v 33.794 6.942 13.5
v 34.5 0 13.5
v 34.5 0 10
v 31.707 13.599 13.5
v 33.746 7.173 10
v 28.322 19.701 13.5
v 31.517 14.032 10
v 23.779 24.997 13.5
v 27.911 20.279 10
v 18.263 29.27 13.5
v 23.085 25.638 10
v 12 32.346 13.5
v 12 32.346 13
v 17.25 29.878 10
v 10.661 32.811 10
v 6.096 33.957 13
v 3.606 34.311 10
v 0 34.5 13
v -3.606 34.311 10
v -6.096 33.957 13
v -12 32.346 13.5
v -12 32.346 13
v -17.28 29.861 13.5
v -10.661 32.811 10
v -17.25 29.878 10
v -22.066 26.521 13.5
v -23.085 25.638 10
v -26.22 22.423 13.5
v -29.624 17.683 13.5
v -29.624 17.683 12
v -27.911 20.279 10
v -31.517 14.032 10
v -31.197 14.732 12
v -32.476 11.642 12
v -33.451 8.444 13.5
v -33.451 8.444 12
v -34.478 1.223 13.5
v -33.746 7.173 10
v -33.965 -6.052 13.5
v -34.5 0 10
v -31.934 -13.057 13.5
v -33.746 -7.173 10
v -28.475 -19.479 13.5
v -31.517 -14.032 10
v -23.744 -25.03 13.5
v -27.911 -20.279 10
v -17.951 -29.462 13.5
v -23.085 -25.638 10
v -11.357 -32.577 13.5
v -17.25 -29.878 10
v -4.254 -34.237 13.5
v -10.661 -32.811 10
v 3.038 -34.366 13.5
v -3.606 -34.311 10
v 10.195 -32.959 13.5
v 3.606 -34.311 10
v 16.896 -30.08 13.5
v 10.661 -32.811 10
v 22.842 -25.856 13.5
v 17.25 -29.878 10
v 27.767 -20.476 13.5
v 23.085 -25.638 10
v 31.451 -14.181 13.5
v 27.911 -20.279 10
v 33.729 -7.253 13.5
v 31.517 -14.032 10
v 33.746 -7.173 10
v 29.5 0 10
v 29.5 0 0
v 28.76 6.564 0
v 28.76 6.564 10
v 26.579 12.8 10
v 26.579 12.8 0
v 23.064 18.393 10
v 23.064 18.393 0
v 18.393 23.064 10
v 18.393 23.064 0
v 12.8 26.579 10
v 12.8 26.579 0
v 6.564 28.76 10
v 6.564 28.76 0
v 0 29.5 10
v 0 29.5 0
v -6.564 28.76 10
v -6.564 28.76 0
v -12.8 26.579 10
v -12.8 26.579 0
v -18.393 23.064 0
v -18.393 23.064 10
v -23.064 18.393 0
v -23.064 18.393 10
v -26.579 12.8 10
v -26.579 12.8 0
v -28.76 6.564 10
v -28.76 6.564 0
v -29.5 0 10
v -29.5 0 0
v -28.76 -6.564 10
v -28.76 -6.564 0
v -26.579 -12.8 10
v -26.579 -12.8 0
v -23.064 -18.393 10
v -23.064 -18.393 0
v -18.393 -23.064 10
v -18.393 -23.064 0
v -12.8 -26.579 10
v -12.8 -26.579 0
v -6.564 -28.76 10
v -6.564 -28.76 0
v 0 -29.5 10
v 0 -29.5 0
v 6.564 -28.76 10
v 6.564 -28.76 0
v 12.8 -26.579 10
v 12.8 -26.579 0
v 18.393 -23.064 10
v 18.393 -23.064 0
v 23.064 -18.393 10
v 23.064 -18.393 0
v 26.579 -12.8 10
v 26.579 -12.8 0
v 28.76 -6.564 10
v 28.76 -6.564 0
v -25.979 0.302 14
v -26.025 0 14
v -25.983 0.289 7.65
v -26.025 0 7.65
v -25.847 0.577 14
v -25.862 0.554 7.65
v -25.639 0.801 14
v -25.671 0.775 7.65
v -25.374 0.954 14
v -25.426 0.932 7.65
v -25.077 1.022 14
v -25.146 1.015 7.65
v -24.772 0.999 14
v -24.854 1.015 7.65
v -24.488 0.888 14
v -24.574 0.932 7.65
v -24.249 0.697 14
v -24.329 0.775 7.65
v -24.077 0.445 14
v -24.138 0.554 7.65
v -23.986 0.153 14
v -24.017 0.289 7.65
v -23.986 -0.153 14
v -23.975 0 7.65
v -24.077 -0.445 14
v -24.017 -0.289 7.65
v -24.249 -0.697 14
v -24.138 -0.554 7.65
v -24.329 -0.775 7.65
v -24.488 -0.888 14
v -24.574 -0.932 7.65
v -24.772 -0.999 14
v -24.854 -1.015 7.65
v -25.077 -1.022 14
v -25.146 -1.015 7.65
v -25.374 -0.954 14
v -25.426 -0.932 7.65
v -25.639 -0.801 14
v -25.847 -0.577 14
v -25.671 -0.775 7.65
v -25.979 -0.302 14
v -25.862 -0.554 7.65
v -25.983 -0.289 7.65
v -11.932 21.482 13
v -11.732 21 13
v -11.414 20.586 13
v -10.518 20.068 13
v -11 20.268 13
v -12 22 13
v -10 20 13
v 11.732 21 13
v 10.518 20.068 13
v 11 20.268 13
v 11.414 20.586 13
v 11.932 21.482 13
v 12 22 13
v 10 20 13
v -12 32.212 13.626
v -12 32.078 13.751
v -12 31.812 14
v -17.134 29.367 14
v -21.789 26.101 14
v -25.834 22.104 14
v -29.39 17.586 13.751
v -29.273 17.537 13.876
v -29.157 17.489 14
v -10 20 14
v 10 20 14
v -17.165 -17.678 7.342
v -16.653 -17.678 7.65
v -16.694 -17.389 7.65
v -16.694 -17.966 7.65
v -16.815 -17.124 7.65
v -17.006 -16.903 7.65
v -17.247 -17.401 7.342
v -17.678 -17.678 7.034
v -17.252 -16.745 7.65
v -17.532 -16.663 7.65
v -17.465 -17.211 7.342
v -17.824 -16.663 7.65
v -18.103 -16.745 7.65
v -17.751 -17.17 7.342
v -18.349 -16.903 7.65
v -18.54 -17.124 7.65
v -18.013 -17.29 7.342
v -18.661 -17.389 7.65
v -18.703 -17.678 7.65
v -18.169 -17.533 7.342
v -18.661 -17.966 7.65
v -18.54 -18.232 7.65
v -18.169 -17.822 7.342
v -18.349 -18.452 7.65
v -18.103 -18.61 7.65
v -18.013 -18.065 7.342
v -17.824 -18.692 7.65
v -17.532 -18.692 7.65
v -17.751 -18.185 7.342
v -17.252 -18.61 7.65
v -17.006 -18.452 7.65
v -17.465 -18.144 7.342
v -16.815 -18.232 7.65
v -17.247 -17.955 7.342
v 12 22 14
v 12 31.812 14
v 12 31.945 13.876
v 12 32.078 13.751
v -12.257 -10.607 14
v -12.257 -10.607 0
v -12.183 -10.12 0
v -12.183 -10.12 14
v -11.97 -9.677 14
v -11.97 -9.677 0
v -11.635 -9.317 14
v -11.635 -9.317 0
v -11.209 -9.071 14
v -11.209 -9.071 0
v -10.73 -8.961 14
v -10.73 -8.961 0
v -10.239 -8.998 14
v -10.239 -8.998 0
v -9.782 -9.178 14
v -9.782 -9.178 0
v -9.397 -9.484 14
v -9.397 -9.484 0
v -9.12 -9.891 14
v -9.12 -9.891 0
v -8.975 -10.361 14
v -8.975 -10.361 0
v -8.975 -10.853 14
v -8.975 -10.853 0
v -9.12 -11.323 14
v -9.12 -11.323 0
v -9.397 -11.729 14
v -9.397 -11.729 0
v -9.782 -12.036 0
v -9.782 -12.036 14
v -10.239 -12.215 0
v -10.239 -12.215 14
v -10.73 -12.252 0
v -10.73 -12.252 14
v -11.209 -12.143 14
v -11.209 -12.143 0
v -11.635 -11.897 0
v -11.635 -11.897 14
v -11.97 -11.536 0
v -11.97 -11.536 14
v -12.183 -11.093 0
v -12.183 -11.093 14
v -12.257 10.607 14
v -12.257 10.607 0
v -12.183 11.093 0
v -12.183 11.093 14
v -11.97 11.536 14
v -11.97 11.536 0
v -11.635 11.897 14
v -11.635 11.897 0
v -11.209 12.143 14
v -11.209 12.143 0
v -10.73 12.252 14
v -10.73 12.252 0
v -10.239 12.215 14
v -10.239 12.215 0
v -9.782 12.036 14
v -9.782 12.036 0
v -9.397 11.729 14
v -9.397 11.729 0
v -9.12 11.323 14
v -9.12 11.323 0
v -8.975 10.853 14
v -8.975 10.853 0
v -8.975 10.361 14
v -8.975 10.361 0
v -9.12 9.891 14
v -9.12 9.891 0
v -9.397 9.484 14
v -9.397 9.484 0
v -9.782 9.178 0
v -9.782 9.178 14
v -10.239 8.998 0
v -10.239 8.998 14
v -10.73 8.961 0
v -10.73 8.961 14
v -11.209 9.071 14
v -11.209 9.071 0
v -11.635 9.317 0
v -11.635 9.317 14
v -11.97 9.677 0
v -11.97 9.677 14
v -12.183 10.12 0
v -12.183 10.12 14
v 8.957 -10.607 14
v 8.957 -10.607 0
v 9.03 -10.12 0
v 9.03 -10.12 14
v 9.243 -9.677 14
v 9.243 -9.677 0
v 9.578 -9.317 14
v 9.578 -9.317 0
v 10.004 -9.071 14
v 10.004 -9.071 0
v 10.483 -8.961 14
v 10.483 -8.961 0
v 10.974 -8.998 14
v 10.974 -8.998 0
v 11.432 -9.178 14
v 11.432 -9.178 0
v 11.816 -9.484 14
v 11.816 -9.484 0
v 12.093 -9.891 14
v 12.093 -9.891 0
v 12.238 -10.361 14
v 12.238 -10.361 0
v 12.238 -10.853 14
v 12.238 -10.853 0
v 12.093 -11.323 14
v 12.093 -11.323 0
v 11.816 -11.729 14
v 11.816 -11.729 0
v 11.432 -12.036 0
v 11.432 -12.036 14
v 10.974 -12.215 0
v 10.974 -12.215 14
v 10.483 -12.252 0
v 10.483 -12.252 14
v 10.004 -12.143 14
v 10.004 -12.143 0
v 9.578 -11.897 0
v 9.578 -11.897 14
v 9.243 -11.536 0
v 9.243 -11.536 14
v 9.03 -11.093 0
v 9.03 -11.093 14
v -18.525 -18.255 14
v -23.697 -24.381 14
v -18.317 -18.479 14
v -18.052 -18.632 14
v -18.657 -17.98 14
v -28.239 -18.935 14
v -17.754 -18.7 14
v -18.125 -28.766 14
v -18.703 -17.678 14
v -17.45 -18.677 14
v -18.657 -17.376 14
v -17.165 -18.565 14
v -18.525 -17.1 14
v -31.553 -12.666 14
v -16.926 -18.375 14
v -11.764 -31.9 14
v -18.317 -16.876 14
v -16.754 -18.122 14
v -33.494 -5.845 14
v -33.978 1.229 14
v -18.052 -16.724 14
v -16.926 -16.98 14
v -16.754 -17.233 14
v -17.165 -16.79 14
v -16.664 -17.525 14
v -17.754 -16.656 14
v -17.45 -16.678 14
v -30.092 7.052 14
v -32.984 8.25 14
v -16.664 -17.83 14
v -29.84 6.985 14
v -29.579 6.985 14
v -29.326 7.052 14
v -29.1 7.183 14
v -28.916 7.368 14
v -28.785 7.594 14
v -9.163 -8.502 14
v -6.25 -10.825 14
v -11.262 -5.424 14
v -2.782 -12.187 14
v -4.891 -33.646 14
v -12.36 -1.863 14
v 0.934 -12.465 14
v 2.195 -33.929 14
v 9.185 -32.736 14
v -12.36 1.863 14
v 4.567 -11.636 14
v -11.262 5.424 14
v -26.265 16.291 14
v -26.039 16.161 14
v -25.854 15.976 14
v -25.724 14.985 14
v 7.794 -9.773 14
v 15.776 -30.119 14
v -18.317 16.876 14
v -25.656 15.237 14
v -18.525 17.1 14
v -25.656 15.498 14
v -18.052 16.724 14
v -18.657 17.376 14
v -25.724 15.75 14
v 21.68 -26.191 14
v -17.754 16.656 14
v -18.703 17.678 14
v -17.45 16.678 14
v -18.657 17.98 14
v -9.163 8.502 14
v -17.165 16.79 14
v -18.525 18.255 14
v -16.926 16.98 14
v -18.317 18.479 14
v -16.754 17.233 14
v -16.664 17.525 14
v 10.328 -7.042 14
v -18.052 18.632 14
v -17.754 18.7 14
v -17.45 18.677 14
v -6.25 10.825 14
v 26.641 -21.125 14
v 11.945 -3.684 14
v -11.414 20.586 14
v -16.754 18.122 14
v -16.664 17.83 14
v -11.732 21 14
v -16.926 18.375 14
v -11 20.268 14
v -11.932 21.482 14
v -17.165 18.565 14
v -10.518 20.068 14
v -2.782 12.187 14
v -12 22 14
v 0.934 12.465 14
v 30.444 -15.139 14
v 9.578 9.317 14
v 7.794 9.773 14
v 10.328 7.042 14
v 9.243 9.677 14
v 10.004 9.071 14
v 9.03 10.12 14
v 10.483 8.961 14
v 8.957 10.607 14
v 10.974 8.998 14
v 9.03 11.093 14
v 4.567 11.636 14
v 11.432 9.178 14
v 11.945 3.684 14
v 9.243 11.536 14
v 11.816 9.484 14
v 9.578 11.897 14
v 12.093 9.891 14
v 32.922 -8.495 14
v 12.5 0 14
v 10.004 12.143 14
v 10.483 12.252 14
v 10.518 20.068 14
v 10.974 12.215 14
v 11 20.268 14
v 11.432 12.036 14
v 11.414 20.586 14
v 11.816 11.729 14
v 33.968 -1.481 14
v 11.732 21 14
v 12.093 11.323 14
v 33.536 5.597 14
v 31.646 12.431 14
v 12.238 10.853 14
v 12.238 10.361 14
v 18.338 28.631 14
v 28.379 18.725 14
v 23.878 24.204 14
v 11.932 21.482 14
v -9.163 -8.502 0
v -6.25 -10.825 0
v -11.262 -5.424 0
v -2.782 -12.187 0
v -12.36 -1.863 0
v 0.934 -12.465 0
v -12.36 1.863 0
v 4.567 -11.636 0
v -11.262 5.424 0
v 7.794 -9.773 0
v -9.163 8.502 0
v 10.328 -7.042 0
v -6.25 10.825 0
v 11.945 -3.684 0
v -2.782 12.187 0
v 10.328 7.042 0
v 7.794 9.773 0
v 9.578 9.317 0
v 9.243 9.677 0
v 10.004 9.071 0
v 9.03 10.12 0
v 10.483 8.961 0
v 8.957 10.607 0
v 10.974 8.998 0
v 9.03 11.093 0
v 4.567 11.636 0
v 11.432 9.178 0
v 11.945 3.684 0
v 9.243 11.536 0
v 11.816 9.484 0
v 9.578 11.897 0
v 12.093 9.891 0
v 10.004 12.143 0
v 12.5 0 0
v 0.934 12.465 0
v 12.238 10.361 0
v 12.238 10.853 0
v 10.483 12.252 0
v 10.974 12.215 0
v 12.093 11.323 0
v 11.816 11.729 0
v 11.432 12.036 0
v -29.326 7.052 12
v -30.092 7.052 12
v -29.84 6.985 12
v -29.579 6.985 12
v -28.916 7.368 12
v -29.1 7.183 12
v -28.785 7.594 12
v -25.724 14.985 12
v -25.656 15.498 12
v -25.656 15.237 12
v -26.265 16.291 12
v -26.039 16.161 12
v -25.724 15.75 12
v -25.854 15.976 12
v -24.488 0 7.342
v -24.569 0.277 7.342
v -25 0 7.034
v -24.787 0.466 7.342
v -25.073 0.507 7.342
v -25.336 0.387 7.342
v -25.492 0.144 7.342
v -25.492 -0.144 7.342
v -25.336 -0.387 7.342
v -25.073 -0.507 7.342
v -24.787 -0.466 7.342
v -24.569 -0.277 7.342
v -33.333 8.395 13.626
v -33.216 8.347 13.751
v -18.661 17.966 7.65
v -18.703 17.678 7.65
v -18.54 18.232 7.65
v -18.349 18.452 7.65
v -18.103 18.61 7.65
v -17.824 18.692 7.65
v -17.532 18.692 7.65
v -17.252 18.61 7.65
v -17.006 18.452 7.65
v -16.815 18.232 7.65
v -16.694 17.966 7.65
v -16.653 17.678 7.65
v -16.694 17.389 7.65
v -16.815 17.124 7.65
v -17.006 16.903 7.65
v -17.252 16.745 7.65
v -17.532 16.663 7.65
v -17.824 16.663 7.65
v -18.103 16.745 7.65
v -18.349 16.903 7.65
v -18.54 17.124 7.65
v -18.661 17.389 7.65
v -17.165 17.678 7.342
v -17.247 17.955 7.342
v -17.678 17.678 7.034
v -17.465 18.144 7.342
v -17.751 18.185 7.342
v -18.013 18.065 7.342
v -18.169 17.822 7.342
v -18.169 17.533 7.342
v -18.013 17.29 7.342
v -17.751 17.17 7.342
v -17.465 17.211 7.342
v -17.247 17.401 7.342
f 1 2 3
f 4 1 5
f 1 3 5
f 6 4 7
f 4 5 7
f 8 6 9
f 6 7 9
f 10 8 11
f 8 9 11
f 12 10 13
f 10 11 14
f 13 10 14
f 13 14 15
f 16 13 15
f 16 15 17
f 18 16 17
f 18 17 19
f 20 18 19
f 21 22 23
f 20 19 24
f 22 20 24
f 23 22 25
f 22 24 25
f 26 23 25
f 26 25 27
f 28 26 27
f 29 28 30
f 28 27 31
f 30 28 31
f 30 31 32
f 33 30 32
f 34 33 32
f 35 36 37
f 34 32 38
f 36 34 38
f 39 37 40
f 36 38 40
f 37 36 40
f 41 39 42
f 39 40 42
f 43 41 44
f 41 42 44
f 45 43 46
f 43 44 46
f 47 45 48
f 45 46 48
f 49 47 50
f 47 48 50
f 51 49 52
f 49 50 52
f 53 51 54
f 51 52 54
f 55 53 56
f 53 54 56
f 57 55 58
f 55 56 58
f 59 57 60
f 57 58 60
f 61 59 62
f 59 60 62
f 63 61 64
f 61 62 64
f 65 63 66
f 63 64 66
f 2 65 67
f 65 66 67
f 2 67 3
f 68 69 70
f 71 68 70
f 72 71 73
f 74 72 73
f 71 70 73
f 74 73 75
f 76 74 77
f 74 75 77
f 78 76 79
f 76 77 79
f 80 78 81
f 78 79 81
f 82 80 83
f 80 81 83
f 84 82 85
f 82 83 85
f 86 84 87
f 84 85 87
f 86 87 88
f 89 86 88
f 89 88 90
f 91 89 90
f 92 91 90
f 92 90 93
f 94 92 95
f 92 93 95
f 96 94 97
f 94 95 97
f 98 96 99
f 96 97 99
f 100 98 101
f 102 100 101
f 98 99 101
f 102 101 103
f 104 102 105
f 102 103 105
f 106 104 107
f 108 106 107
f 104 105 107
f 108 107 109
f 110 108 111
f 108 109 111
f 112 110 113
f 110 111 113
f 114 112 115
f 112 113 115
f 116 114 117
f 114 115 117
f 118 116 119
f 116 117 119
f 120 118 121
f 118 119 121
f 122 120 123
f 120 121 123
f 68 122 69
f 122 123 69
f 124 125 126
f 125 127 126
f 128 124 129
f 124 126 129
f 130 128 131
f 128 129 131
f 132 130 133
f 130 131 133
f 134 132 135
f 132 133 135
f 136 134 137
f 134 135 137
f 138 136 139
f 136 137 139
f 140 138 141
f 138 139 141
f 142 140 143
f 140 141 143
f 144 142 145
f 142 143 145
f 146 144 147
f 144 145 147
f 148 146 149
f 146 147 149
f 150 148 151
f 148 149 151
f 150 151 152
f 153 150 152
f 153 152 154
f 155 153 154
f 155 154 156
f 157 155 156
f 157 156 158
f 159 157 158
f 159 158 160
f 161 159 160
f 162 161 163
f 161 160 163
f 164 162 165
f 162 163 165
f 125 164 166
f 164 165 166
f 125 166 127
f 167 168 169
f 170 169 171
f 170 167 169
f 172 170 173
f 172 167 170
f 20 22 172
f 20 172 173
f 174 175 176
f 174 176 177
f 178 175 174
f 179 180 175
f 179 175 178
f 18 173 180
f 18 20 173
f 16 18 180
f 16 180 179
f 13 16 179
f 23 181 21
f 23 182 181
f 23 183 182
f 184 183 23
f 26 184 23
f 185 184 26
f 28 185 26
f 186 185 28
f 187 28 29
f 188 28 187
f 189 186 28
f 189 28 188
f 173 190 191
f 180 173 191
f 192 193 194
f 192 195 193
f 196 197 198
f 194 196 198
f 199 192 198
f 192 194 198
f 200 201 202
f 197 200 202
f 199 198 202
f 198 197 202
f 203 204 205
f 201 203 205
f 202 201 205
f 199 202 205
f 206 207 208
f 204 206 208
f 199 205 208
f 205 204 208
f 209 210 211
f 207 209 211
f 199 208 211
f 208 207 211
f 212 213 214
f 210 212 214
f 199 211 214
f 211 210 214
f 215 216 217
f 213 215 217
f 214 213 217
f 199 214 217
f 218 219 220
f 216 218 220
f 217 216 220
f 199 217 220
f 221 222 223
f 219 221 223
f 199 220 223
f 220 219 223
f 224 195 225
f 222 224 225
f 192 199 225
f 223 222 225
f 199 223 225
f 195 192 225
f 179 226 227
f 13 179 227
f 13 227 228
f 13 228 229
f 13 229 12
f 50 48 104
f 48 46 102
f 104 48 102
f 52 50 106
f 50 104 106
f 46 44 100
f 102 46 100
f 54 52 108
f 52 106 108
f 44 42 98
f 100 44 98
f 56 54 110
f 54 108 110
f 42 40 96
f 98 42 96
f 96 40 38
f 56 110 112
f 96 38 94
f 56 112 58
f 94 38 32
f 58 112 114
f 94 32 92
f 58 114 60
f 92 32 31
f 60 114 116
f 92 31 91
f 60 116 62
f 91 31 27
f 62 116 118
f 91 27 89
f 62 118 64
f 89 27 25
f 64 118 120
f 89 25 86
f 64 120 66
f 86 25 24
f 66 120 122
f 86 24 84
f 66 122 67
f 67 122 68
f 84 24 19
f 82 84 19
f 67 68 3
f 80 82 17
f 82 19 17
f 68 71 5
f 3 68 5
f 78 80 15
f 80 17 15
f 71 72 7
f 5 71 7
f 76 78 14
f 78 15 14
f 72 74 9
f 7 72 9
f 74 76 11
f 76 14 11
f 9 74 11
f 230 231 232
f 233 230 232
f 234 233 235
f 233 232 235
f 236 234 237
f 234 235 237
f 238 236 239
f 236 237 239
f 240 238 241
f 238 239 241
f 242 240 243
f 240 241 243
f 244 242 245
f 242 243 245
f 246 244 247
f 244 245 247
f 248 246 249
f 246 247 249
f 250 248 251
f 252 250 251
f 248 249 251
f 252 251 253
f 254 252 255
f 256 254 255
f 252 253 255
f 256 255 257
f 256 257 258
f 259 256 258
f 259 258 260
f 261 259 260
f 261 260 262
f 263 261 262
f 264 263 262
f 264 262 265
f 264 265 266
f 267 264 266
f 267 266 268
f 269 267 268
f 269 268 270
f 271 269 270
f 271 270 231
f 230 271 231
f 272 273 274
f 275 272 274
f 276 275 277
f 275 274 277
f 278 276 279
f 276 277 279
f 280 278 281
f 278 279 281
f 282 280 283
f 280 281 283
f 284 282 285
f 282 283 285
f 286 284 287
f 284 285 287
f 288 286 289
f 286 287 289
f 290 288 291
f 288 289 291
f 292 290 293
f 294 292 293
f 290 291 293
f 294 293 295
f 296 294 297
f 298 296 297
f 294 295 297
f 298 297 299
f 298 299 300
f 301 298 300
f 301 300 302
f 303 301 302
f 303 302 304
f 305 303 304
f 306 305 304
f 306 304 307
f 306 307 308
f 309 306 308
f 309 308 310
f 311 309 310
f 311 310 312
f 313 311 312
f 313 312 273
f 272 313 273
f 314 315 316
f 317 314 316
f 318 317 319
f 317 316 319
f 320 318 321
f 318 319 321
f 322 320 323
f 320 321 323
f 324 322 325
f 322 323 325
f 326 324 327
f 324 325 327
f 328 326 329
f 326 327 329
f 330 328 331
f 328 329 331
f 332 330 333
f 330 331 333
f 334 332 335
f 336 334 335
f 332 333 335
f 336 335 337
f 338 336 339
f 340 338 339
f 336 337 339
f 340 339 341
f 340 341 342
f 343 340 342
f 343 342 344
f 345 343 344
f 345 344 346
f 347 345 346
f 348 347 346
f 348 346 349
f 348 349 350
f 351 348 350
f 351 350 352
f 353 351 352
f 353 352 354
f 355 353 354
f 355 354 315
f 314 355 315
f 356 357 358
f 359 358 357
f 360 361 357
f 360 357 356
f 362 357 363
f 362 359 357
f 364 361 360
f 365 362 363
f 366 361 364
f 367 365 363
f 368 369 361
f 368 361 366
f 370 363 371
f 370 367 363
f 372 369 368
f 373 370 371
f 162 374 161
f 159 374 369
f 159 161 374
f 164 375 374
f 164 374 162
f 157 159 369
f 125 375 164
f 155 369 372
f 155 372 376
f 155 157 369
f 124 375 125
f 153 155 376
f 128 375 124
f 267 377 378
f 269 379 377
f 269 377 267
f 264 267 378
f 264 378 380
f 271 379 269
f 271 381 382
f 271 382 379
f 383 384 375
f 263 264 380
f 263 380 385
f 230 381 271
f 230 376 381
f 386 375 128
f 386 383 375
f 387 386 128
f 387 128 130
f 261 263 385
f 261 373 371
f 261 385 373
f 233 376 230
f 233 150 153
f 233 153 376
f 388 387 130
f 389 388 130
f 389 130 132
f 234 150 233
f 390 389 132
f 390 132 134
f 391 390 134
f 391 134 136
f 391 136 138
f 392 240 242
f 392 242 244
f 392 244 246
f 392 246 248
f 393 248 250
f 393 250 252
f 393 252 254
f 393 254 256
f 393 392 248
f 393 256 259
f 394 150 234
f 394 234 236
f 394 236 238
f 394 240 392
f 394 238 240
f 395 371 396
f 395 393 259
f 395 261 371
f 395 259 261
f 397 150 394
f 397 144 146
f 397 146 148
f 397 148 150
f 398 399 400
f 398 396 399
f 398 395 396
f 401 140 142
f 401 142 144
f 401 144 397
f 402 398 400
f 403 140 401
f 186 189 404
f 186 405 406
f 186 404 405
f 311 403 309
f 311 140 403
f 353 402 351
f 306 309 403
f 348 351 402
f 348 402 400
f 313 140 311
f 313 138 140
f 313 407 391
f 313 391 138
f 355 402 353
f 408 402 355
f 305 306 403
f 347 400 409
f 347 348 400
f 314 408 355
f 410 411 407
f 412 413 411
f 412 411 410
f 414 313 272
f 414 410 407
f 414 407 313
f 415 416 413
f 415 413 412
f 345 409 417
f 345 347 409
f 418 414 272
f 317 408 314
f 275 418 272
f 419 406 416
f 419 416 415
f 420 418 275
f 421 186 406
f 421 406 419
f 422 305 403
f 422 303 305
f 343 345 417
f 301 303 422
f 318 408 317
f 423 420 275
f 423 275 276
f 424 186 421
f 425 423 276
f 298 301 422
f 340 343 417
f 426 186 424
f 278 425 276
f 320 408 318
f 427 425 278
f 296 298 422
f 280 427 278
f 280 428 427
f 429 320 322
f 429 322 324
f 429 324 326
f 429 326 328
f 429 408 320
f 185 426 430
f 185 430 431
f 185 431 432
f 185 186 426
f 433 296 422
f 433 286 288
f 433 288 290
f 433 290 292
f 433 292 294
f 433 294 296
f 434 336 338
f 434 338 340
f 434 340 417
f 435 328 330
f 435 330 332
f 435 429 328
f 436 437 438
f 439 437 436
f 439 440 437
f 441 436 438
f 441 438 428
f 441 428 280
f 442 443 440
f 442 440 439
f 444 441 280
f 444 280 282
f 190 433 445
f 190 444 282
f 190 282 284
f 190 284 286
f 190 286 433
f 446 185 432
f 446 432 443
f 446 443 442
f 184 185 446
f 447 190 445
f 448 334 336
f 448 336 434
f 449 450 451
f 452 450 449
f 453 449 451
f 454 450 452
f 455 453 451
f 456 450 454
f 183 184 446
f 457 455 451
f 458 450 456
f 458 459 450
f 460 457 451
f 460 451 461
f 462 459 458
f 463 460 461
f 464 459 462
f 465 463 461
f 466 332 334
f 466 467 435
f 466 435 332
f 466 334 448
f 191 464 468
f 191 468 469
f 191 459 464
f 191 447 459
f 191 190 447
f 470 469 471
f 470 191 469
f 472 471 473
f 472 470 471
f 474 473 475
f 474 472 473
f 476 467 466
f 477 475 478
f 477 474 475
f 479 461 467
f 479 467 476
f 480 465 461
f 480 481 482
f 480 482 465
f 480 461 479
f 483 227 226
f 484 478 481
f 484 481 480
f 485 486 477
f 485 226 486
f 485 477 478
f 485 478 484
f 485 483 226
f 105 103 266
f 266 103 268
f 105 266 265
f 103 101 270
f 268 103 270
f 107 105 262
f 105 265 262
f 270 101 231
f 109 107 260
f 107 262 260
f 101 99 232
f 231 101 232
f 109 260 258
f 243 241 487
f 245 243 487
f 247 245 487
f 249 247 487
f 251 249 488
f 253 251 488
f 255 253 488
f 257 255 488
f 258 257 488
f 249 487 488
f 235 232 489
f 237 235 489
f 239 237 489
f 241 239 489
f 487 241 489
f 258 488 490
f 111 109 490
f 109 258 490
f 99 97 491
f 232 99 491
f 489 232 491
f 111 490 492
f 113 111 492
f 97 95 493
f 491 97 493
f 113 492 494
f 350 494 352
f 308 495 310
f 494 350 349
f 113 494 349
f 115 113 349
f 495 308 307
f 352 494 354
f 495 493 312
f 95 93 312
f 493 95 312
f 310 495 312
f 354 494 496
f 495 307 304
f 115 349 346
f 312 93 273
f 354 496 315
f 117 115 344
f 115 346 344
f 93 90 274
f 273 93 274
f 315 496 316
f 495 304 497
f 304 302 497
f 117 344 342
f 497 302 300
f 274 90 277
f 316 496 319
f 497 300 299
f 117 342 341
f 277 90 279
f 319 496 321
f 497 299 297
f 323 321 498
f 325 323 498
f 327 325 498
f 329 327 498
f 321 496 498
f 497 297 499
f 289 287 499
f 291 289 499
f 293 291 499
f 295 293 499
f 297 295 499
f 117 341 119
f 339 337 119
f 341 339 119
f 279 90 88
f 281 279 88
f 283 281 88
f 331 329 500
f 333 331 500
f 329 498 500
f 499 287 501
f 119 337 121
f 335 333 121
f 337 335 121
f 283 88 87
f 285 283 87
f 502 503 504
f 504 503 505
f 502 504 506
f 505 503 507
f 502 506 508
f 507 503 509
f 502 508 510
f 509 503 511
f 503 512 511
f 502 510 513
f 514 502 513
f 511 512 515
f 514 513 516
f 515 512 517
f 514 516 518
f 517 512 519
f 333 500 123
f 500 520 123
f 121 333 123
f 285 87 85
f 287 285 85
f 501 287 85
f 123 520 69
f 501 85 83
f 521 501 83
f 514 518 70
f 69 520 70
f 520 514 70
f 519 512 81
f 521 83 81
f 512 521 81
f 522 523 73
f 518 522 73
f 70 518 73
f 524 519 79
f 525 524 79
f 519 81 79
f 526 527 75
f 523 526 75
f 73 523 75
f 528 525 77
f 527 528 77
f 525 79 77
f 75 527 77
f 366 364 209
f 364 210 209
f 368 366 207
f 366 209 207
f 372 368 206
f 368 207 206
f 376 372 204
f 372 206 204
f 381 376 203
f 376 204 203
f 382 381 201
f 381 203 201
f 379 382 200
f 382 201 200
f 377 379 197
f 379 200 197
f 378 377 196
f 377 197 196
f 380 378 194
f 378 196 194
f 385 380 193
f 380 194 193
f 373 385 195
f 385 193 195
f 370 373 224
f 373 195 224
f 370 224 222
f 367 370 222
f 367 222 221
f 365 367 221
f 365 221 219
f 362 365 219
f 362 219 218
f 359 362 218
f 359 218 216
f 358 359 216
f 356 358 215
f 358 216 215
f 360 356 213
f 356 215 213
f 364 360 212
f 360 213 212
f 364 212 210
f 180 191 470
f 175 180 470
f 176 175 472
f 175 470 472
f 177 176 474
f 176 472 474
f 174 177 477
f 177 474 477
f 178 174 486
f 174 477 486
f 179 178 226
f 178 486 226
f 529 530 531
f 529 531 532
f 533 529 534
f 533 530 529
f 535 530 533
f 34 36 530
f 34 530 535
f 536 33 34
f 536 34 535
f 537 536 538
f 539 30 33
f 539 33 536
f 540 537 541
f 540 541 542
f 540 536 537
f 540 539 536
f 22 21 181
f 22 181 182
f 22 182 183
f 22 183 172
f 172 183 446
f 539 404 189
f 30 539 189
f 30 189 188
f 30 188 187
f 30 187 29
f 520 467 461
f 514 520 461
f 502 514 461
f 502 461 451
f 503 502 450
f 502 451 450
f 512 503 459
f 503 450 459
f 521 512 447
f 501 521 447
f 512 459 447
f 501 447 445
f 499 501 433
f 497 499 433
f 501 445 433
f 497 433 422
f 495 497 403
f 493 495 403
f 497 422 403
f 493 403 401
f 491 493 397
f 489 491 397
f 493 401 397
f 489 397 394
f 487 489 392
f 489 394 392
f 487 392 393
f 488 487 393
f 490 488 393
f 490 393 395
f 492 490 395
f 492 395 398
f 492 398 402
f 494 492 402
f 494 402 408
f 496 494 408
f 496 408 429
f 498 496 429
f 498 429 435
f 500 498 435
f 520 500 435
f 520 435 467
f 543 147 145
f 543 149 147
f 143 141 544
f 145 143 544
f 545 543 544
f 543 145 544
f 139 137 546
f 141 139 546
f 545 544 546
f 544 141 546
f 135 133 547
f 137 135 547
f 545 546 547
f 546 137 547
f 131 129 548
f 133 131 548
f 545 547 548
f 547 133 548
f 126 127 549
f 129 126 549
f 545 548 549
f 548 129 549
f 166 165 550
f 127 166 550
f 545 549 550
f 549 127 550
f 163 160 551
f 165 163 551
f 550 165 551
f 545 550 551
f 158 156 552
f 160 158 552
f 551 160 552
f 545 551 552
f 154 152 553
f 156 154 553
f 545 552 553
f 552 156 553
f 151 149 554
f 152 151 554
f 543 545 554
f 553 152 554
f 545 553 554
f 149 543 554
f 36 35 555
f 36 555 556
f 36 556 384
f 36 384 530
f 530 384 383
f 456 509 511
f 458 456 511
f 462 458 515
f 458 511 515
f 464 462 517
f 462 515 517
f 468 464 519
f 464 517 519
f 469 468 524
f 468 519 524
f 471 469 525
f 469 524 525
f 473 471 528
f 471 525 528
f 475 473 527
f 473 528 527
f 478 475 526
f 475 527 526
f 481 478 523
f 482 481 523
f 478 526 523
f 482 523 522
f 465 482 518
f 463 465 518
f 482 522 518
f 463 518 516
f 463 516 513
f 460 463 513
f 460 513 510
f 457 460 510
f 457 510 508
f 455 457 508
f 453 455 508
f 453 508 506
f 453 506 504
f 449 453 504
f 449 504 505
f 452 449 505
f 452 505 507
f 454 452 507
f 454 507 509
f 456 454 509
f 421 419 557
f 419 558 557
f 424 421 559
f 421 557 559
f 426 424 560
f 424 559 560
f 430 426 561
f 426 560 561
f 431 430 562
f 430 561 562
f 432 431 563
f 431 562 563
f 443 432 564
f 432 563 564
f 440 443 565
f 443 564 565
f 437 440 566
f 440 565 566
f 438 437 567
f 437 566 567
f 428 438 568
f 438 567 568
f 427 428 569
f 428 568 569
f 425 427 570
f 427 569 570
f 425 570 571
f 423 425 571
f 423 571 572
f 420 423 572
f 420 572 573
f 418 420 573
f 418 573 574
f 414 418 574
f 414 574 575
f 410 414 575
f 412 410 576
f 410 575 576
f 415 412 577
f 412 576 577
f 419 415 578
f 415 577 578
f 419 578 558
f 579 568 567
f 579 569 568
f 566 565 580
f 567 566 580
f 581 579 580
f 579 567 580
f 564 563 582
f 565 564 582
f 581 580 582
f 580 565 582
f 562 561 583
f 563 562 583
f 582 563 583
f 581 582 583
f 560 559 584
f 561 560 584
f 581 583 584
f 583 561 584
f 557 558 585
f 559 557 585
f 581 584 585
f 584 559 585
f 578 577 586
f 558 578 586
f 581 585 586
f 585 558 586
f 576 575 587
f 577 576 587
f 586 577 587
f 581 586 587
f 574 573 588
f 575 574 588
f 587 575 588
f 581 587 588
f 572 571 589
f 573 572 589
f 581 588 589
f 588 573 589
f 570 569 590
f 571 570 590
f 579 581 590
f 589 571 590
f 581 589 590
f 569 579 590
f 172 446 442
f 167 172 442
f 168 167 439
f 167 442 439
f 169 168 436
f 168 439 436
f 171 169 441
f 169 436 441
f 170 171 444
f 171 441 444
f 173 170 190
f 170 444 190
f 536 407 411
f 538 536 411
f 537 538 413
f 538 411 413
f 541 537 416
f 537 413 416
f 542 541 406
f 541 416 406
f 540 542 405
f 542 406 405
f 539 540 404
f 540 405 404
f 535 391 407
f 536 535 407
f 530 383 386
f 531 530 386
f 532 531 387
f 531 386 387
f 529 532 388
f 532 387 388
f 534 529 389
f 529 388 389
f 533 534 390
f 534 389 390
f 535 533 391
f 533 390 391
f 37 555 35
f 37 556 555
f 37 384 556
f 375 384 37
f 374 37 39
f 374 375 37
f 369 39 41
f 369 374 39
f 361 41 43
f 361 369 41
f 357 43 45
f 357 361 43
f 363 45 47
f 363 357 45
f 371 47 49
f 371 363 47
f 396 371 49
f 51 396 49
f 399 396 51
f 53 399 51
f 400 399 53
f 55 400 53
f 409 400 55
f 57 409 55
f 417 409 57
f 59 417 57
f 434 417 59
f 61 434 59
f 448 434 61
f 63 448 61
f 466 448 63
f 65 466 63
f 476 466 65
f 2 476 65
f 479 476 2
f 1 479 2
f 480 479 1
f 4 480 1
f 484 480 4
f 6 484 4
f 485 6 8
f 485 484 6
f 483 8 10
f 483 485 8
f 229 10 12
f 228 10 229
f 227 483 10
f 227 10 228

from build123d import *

# Parameters (mm, degrees)
SKETCH1_R               = 29.5
BOSS_EXTRUDE1_DEPTH     = 10
SKETCH2_R               = 34.5
BOSS_EXTRUDE2_DEPTH     = 4
SKETCH3_R               = 12.5
CUT_EXTRUDE1_DEPTH      = 15
M4_TAPPED_HOLE1_D       = 3.3
M2_5_TAPPED_HOLE1_D     = 2.05
M2_5_TAPPED_HOLE1_DEPTH = 6.35
M2_5_TAPPED_HOLE1_TIP   = 0.615882135
CHAMFER1_SIZE           = 0.5
CUT_EXTRUDE2_DEPTH      = 2
CUT_EXTRUDE4_DEPTH      = 1


with BuildPart() as part:
    # Sketch1 → Boss-Extrude1 (new body)
    with BuildSketch(Plane.XY):
        Circle(SKETCH1_R)
    extrude(amount=BOSS_EXTRUDE1_DEPTH)

    # Sketch2 → Boss-Extrude2 (add)
    with BuildSketch(Plane.XY.offset(10)):
        Circle(SKETCH2_R)
    extrude(amount=BOSS_EXTRUDE2_DEPTH)

    # Sketch3 → Cut-Extrude1 (cut, through all)
    with BuildSketch(Plane.XY.offset(14)):
        Circle(SKETCH3_R)
    extrude(amount=-CUT_EXTRUDE1_DEPTH, mode=Mode.SUBTRACT)

    # M4 Tapped Hole1 (through all)
    with Locations(Plane.XY.offset(14)):
        with Locations((-10.606601718, 10.606601718), (10.606601718, 10.606601718), (10.606601718, -10.606601718), (-10.606601718, -10.606601718)):
            Hole(M4_TAPPED_HOLE1_D / 2)

    # M2.5 Tapped Hole1
    with Locations(Plane.XY.offset(14)):
        with Locations((-17.67766953, -17.67766953), (-25, 0), (-17.67766953, 17.67766953)):
            Hole(M2_5_TAPPED_HOLE1_D / 2, depth=M2_5_TAPPED_HOLE1_DEPTH)
            with Locations((0, 0, -(M2_5_TAPPED_HOLE1_DEPTH + M2_5_TAPPED_HOLE1_TIP / 2))):  # 118° drill point
                Cone(0, M2_5_TAPPED_HOLE1_D / 2, M2_5_TAPPED_HOLE1_TIP, mode=Mode.SUBTRACT)

    # Chamfer1
    chamfer1_edges = [part.edges().sort_by_distance(p)[0] for p in [
        (-34.5, 0, 14),
    ]]
    chamfer(chamfer1_edges, length=CHAMFER1_SIZE)

    # Sketch9 → Cut-Extrude2 (cut)
    with BuildSketch(Plane.XY.offset(14)):
        with BuildLine():
            Line((-33.450745653, 8.44379152), (-30.091742903, 7.052447025))
            ThreePointArc((-30.091742903, 7.052447025), (-29.326376039, 7.052447025), (-28.785179939, 7.593643125))
            Line((-28.785179939, 7.593643125), (-25.72371248, 14.984679385))
            ThreePointArc((-25.72371248, 14.984679385), (-25.72371248, 15.75004625), (-26.26490858, 16.29124235))
            Line((-26.26490858, 16.29124235), (-29.62391133, 17.682586845))
            ThreePointArc((-29.62391133, 17.682586845), (-31.873843872, 13.202578417), (-33.450745653, 8.44379152))
        make_face()
    extrude(amount=-CUT_EXTRUDE2_DEPTH, mode=Mode.SUBTRACT)

    # Sketch11 → Cut-Extrude4 (cut)
    with BuildSketch(Plane.XY.offset(14)):
        with BuildLine():
            Line((-12, 32.345787979), (-12, 22))
            ThreePointArc((-12, 22), (-11.414213562, 20.585786438), (-10, 20))
            Line((-10, 20), (10, 20))
            ThreePointArc((10, 20), (11.414213562, 20.585786438), (12, 22))
            Line((12, 22), (12, 32.345787979))
            ThreePointArc((12, 32.345787979), (0, 34.5), (-12, 32.345787979))
        make_face()
    extrude(amount=-CUT_EXTRUDE4_DEPTH, mode=Mode.SUBTRACT)


solid = part.part
